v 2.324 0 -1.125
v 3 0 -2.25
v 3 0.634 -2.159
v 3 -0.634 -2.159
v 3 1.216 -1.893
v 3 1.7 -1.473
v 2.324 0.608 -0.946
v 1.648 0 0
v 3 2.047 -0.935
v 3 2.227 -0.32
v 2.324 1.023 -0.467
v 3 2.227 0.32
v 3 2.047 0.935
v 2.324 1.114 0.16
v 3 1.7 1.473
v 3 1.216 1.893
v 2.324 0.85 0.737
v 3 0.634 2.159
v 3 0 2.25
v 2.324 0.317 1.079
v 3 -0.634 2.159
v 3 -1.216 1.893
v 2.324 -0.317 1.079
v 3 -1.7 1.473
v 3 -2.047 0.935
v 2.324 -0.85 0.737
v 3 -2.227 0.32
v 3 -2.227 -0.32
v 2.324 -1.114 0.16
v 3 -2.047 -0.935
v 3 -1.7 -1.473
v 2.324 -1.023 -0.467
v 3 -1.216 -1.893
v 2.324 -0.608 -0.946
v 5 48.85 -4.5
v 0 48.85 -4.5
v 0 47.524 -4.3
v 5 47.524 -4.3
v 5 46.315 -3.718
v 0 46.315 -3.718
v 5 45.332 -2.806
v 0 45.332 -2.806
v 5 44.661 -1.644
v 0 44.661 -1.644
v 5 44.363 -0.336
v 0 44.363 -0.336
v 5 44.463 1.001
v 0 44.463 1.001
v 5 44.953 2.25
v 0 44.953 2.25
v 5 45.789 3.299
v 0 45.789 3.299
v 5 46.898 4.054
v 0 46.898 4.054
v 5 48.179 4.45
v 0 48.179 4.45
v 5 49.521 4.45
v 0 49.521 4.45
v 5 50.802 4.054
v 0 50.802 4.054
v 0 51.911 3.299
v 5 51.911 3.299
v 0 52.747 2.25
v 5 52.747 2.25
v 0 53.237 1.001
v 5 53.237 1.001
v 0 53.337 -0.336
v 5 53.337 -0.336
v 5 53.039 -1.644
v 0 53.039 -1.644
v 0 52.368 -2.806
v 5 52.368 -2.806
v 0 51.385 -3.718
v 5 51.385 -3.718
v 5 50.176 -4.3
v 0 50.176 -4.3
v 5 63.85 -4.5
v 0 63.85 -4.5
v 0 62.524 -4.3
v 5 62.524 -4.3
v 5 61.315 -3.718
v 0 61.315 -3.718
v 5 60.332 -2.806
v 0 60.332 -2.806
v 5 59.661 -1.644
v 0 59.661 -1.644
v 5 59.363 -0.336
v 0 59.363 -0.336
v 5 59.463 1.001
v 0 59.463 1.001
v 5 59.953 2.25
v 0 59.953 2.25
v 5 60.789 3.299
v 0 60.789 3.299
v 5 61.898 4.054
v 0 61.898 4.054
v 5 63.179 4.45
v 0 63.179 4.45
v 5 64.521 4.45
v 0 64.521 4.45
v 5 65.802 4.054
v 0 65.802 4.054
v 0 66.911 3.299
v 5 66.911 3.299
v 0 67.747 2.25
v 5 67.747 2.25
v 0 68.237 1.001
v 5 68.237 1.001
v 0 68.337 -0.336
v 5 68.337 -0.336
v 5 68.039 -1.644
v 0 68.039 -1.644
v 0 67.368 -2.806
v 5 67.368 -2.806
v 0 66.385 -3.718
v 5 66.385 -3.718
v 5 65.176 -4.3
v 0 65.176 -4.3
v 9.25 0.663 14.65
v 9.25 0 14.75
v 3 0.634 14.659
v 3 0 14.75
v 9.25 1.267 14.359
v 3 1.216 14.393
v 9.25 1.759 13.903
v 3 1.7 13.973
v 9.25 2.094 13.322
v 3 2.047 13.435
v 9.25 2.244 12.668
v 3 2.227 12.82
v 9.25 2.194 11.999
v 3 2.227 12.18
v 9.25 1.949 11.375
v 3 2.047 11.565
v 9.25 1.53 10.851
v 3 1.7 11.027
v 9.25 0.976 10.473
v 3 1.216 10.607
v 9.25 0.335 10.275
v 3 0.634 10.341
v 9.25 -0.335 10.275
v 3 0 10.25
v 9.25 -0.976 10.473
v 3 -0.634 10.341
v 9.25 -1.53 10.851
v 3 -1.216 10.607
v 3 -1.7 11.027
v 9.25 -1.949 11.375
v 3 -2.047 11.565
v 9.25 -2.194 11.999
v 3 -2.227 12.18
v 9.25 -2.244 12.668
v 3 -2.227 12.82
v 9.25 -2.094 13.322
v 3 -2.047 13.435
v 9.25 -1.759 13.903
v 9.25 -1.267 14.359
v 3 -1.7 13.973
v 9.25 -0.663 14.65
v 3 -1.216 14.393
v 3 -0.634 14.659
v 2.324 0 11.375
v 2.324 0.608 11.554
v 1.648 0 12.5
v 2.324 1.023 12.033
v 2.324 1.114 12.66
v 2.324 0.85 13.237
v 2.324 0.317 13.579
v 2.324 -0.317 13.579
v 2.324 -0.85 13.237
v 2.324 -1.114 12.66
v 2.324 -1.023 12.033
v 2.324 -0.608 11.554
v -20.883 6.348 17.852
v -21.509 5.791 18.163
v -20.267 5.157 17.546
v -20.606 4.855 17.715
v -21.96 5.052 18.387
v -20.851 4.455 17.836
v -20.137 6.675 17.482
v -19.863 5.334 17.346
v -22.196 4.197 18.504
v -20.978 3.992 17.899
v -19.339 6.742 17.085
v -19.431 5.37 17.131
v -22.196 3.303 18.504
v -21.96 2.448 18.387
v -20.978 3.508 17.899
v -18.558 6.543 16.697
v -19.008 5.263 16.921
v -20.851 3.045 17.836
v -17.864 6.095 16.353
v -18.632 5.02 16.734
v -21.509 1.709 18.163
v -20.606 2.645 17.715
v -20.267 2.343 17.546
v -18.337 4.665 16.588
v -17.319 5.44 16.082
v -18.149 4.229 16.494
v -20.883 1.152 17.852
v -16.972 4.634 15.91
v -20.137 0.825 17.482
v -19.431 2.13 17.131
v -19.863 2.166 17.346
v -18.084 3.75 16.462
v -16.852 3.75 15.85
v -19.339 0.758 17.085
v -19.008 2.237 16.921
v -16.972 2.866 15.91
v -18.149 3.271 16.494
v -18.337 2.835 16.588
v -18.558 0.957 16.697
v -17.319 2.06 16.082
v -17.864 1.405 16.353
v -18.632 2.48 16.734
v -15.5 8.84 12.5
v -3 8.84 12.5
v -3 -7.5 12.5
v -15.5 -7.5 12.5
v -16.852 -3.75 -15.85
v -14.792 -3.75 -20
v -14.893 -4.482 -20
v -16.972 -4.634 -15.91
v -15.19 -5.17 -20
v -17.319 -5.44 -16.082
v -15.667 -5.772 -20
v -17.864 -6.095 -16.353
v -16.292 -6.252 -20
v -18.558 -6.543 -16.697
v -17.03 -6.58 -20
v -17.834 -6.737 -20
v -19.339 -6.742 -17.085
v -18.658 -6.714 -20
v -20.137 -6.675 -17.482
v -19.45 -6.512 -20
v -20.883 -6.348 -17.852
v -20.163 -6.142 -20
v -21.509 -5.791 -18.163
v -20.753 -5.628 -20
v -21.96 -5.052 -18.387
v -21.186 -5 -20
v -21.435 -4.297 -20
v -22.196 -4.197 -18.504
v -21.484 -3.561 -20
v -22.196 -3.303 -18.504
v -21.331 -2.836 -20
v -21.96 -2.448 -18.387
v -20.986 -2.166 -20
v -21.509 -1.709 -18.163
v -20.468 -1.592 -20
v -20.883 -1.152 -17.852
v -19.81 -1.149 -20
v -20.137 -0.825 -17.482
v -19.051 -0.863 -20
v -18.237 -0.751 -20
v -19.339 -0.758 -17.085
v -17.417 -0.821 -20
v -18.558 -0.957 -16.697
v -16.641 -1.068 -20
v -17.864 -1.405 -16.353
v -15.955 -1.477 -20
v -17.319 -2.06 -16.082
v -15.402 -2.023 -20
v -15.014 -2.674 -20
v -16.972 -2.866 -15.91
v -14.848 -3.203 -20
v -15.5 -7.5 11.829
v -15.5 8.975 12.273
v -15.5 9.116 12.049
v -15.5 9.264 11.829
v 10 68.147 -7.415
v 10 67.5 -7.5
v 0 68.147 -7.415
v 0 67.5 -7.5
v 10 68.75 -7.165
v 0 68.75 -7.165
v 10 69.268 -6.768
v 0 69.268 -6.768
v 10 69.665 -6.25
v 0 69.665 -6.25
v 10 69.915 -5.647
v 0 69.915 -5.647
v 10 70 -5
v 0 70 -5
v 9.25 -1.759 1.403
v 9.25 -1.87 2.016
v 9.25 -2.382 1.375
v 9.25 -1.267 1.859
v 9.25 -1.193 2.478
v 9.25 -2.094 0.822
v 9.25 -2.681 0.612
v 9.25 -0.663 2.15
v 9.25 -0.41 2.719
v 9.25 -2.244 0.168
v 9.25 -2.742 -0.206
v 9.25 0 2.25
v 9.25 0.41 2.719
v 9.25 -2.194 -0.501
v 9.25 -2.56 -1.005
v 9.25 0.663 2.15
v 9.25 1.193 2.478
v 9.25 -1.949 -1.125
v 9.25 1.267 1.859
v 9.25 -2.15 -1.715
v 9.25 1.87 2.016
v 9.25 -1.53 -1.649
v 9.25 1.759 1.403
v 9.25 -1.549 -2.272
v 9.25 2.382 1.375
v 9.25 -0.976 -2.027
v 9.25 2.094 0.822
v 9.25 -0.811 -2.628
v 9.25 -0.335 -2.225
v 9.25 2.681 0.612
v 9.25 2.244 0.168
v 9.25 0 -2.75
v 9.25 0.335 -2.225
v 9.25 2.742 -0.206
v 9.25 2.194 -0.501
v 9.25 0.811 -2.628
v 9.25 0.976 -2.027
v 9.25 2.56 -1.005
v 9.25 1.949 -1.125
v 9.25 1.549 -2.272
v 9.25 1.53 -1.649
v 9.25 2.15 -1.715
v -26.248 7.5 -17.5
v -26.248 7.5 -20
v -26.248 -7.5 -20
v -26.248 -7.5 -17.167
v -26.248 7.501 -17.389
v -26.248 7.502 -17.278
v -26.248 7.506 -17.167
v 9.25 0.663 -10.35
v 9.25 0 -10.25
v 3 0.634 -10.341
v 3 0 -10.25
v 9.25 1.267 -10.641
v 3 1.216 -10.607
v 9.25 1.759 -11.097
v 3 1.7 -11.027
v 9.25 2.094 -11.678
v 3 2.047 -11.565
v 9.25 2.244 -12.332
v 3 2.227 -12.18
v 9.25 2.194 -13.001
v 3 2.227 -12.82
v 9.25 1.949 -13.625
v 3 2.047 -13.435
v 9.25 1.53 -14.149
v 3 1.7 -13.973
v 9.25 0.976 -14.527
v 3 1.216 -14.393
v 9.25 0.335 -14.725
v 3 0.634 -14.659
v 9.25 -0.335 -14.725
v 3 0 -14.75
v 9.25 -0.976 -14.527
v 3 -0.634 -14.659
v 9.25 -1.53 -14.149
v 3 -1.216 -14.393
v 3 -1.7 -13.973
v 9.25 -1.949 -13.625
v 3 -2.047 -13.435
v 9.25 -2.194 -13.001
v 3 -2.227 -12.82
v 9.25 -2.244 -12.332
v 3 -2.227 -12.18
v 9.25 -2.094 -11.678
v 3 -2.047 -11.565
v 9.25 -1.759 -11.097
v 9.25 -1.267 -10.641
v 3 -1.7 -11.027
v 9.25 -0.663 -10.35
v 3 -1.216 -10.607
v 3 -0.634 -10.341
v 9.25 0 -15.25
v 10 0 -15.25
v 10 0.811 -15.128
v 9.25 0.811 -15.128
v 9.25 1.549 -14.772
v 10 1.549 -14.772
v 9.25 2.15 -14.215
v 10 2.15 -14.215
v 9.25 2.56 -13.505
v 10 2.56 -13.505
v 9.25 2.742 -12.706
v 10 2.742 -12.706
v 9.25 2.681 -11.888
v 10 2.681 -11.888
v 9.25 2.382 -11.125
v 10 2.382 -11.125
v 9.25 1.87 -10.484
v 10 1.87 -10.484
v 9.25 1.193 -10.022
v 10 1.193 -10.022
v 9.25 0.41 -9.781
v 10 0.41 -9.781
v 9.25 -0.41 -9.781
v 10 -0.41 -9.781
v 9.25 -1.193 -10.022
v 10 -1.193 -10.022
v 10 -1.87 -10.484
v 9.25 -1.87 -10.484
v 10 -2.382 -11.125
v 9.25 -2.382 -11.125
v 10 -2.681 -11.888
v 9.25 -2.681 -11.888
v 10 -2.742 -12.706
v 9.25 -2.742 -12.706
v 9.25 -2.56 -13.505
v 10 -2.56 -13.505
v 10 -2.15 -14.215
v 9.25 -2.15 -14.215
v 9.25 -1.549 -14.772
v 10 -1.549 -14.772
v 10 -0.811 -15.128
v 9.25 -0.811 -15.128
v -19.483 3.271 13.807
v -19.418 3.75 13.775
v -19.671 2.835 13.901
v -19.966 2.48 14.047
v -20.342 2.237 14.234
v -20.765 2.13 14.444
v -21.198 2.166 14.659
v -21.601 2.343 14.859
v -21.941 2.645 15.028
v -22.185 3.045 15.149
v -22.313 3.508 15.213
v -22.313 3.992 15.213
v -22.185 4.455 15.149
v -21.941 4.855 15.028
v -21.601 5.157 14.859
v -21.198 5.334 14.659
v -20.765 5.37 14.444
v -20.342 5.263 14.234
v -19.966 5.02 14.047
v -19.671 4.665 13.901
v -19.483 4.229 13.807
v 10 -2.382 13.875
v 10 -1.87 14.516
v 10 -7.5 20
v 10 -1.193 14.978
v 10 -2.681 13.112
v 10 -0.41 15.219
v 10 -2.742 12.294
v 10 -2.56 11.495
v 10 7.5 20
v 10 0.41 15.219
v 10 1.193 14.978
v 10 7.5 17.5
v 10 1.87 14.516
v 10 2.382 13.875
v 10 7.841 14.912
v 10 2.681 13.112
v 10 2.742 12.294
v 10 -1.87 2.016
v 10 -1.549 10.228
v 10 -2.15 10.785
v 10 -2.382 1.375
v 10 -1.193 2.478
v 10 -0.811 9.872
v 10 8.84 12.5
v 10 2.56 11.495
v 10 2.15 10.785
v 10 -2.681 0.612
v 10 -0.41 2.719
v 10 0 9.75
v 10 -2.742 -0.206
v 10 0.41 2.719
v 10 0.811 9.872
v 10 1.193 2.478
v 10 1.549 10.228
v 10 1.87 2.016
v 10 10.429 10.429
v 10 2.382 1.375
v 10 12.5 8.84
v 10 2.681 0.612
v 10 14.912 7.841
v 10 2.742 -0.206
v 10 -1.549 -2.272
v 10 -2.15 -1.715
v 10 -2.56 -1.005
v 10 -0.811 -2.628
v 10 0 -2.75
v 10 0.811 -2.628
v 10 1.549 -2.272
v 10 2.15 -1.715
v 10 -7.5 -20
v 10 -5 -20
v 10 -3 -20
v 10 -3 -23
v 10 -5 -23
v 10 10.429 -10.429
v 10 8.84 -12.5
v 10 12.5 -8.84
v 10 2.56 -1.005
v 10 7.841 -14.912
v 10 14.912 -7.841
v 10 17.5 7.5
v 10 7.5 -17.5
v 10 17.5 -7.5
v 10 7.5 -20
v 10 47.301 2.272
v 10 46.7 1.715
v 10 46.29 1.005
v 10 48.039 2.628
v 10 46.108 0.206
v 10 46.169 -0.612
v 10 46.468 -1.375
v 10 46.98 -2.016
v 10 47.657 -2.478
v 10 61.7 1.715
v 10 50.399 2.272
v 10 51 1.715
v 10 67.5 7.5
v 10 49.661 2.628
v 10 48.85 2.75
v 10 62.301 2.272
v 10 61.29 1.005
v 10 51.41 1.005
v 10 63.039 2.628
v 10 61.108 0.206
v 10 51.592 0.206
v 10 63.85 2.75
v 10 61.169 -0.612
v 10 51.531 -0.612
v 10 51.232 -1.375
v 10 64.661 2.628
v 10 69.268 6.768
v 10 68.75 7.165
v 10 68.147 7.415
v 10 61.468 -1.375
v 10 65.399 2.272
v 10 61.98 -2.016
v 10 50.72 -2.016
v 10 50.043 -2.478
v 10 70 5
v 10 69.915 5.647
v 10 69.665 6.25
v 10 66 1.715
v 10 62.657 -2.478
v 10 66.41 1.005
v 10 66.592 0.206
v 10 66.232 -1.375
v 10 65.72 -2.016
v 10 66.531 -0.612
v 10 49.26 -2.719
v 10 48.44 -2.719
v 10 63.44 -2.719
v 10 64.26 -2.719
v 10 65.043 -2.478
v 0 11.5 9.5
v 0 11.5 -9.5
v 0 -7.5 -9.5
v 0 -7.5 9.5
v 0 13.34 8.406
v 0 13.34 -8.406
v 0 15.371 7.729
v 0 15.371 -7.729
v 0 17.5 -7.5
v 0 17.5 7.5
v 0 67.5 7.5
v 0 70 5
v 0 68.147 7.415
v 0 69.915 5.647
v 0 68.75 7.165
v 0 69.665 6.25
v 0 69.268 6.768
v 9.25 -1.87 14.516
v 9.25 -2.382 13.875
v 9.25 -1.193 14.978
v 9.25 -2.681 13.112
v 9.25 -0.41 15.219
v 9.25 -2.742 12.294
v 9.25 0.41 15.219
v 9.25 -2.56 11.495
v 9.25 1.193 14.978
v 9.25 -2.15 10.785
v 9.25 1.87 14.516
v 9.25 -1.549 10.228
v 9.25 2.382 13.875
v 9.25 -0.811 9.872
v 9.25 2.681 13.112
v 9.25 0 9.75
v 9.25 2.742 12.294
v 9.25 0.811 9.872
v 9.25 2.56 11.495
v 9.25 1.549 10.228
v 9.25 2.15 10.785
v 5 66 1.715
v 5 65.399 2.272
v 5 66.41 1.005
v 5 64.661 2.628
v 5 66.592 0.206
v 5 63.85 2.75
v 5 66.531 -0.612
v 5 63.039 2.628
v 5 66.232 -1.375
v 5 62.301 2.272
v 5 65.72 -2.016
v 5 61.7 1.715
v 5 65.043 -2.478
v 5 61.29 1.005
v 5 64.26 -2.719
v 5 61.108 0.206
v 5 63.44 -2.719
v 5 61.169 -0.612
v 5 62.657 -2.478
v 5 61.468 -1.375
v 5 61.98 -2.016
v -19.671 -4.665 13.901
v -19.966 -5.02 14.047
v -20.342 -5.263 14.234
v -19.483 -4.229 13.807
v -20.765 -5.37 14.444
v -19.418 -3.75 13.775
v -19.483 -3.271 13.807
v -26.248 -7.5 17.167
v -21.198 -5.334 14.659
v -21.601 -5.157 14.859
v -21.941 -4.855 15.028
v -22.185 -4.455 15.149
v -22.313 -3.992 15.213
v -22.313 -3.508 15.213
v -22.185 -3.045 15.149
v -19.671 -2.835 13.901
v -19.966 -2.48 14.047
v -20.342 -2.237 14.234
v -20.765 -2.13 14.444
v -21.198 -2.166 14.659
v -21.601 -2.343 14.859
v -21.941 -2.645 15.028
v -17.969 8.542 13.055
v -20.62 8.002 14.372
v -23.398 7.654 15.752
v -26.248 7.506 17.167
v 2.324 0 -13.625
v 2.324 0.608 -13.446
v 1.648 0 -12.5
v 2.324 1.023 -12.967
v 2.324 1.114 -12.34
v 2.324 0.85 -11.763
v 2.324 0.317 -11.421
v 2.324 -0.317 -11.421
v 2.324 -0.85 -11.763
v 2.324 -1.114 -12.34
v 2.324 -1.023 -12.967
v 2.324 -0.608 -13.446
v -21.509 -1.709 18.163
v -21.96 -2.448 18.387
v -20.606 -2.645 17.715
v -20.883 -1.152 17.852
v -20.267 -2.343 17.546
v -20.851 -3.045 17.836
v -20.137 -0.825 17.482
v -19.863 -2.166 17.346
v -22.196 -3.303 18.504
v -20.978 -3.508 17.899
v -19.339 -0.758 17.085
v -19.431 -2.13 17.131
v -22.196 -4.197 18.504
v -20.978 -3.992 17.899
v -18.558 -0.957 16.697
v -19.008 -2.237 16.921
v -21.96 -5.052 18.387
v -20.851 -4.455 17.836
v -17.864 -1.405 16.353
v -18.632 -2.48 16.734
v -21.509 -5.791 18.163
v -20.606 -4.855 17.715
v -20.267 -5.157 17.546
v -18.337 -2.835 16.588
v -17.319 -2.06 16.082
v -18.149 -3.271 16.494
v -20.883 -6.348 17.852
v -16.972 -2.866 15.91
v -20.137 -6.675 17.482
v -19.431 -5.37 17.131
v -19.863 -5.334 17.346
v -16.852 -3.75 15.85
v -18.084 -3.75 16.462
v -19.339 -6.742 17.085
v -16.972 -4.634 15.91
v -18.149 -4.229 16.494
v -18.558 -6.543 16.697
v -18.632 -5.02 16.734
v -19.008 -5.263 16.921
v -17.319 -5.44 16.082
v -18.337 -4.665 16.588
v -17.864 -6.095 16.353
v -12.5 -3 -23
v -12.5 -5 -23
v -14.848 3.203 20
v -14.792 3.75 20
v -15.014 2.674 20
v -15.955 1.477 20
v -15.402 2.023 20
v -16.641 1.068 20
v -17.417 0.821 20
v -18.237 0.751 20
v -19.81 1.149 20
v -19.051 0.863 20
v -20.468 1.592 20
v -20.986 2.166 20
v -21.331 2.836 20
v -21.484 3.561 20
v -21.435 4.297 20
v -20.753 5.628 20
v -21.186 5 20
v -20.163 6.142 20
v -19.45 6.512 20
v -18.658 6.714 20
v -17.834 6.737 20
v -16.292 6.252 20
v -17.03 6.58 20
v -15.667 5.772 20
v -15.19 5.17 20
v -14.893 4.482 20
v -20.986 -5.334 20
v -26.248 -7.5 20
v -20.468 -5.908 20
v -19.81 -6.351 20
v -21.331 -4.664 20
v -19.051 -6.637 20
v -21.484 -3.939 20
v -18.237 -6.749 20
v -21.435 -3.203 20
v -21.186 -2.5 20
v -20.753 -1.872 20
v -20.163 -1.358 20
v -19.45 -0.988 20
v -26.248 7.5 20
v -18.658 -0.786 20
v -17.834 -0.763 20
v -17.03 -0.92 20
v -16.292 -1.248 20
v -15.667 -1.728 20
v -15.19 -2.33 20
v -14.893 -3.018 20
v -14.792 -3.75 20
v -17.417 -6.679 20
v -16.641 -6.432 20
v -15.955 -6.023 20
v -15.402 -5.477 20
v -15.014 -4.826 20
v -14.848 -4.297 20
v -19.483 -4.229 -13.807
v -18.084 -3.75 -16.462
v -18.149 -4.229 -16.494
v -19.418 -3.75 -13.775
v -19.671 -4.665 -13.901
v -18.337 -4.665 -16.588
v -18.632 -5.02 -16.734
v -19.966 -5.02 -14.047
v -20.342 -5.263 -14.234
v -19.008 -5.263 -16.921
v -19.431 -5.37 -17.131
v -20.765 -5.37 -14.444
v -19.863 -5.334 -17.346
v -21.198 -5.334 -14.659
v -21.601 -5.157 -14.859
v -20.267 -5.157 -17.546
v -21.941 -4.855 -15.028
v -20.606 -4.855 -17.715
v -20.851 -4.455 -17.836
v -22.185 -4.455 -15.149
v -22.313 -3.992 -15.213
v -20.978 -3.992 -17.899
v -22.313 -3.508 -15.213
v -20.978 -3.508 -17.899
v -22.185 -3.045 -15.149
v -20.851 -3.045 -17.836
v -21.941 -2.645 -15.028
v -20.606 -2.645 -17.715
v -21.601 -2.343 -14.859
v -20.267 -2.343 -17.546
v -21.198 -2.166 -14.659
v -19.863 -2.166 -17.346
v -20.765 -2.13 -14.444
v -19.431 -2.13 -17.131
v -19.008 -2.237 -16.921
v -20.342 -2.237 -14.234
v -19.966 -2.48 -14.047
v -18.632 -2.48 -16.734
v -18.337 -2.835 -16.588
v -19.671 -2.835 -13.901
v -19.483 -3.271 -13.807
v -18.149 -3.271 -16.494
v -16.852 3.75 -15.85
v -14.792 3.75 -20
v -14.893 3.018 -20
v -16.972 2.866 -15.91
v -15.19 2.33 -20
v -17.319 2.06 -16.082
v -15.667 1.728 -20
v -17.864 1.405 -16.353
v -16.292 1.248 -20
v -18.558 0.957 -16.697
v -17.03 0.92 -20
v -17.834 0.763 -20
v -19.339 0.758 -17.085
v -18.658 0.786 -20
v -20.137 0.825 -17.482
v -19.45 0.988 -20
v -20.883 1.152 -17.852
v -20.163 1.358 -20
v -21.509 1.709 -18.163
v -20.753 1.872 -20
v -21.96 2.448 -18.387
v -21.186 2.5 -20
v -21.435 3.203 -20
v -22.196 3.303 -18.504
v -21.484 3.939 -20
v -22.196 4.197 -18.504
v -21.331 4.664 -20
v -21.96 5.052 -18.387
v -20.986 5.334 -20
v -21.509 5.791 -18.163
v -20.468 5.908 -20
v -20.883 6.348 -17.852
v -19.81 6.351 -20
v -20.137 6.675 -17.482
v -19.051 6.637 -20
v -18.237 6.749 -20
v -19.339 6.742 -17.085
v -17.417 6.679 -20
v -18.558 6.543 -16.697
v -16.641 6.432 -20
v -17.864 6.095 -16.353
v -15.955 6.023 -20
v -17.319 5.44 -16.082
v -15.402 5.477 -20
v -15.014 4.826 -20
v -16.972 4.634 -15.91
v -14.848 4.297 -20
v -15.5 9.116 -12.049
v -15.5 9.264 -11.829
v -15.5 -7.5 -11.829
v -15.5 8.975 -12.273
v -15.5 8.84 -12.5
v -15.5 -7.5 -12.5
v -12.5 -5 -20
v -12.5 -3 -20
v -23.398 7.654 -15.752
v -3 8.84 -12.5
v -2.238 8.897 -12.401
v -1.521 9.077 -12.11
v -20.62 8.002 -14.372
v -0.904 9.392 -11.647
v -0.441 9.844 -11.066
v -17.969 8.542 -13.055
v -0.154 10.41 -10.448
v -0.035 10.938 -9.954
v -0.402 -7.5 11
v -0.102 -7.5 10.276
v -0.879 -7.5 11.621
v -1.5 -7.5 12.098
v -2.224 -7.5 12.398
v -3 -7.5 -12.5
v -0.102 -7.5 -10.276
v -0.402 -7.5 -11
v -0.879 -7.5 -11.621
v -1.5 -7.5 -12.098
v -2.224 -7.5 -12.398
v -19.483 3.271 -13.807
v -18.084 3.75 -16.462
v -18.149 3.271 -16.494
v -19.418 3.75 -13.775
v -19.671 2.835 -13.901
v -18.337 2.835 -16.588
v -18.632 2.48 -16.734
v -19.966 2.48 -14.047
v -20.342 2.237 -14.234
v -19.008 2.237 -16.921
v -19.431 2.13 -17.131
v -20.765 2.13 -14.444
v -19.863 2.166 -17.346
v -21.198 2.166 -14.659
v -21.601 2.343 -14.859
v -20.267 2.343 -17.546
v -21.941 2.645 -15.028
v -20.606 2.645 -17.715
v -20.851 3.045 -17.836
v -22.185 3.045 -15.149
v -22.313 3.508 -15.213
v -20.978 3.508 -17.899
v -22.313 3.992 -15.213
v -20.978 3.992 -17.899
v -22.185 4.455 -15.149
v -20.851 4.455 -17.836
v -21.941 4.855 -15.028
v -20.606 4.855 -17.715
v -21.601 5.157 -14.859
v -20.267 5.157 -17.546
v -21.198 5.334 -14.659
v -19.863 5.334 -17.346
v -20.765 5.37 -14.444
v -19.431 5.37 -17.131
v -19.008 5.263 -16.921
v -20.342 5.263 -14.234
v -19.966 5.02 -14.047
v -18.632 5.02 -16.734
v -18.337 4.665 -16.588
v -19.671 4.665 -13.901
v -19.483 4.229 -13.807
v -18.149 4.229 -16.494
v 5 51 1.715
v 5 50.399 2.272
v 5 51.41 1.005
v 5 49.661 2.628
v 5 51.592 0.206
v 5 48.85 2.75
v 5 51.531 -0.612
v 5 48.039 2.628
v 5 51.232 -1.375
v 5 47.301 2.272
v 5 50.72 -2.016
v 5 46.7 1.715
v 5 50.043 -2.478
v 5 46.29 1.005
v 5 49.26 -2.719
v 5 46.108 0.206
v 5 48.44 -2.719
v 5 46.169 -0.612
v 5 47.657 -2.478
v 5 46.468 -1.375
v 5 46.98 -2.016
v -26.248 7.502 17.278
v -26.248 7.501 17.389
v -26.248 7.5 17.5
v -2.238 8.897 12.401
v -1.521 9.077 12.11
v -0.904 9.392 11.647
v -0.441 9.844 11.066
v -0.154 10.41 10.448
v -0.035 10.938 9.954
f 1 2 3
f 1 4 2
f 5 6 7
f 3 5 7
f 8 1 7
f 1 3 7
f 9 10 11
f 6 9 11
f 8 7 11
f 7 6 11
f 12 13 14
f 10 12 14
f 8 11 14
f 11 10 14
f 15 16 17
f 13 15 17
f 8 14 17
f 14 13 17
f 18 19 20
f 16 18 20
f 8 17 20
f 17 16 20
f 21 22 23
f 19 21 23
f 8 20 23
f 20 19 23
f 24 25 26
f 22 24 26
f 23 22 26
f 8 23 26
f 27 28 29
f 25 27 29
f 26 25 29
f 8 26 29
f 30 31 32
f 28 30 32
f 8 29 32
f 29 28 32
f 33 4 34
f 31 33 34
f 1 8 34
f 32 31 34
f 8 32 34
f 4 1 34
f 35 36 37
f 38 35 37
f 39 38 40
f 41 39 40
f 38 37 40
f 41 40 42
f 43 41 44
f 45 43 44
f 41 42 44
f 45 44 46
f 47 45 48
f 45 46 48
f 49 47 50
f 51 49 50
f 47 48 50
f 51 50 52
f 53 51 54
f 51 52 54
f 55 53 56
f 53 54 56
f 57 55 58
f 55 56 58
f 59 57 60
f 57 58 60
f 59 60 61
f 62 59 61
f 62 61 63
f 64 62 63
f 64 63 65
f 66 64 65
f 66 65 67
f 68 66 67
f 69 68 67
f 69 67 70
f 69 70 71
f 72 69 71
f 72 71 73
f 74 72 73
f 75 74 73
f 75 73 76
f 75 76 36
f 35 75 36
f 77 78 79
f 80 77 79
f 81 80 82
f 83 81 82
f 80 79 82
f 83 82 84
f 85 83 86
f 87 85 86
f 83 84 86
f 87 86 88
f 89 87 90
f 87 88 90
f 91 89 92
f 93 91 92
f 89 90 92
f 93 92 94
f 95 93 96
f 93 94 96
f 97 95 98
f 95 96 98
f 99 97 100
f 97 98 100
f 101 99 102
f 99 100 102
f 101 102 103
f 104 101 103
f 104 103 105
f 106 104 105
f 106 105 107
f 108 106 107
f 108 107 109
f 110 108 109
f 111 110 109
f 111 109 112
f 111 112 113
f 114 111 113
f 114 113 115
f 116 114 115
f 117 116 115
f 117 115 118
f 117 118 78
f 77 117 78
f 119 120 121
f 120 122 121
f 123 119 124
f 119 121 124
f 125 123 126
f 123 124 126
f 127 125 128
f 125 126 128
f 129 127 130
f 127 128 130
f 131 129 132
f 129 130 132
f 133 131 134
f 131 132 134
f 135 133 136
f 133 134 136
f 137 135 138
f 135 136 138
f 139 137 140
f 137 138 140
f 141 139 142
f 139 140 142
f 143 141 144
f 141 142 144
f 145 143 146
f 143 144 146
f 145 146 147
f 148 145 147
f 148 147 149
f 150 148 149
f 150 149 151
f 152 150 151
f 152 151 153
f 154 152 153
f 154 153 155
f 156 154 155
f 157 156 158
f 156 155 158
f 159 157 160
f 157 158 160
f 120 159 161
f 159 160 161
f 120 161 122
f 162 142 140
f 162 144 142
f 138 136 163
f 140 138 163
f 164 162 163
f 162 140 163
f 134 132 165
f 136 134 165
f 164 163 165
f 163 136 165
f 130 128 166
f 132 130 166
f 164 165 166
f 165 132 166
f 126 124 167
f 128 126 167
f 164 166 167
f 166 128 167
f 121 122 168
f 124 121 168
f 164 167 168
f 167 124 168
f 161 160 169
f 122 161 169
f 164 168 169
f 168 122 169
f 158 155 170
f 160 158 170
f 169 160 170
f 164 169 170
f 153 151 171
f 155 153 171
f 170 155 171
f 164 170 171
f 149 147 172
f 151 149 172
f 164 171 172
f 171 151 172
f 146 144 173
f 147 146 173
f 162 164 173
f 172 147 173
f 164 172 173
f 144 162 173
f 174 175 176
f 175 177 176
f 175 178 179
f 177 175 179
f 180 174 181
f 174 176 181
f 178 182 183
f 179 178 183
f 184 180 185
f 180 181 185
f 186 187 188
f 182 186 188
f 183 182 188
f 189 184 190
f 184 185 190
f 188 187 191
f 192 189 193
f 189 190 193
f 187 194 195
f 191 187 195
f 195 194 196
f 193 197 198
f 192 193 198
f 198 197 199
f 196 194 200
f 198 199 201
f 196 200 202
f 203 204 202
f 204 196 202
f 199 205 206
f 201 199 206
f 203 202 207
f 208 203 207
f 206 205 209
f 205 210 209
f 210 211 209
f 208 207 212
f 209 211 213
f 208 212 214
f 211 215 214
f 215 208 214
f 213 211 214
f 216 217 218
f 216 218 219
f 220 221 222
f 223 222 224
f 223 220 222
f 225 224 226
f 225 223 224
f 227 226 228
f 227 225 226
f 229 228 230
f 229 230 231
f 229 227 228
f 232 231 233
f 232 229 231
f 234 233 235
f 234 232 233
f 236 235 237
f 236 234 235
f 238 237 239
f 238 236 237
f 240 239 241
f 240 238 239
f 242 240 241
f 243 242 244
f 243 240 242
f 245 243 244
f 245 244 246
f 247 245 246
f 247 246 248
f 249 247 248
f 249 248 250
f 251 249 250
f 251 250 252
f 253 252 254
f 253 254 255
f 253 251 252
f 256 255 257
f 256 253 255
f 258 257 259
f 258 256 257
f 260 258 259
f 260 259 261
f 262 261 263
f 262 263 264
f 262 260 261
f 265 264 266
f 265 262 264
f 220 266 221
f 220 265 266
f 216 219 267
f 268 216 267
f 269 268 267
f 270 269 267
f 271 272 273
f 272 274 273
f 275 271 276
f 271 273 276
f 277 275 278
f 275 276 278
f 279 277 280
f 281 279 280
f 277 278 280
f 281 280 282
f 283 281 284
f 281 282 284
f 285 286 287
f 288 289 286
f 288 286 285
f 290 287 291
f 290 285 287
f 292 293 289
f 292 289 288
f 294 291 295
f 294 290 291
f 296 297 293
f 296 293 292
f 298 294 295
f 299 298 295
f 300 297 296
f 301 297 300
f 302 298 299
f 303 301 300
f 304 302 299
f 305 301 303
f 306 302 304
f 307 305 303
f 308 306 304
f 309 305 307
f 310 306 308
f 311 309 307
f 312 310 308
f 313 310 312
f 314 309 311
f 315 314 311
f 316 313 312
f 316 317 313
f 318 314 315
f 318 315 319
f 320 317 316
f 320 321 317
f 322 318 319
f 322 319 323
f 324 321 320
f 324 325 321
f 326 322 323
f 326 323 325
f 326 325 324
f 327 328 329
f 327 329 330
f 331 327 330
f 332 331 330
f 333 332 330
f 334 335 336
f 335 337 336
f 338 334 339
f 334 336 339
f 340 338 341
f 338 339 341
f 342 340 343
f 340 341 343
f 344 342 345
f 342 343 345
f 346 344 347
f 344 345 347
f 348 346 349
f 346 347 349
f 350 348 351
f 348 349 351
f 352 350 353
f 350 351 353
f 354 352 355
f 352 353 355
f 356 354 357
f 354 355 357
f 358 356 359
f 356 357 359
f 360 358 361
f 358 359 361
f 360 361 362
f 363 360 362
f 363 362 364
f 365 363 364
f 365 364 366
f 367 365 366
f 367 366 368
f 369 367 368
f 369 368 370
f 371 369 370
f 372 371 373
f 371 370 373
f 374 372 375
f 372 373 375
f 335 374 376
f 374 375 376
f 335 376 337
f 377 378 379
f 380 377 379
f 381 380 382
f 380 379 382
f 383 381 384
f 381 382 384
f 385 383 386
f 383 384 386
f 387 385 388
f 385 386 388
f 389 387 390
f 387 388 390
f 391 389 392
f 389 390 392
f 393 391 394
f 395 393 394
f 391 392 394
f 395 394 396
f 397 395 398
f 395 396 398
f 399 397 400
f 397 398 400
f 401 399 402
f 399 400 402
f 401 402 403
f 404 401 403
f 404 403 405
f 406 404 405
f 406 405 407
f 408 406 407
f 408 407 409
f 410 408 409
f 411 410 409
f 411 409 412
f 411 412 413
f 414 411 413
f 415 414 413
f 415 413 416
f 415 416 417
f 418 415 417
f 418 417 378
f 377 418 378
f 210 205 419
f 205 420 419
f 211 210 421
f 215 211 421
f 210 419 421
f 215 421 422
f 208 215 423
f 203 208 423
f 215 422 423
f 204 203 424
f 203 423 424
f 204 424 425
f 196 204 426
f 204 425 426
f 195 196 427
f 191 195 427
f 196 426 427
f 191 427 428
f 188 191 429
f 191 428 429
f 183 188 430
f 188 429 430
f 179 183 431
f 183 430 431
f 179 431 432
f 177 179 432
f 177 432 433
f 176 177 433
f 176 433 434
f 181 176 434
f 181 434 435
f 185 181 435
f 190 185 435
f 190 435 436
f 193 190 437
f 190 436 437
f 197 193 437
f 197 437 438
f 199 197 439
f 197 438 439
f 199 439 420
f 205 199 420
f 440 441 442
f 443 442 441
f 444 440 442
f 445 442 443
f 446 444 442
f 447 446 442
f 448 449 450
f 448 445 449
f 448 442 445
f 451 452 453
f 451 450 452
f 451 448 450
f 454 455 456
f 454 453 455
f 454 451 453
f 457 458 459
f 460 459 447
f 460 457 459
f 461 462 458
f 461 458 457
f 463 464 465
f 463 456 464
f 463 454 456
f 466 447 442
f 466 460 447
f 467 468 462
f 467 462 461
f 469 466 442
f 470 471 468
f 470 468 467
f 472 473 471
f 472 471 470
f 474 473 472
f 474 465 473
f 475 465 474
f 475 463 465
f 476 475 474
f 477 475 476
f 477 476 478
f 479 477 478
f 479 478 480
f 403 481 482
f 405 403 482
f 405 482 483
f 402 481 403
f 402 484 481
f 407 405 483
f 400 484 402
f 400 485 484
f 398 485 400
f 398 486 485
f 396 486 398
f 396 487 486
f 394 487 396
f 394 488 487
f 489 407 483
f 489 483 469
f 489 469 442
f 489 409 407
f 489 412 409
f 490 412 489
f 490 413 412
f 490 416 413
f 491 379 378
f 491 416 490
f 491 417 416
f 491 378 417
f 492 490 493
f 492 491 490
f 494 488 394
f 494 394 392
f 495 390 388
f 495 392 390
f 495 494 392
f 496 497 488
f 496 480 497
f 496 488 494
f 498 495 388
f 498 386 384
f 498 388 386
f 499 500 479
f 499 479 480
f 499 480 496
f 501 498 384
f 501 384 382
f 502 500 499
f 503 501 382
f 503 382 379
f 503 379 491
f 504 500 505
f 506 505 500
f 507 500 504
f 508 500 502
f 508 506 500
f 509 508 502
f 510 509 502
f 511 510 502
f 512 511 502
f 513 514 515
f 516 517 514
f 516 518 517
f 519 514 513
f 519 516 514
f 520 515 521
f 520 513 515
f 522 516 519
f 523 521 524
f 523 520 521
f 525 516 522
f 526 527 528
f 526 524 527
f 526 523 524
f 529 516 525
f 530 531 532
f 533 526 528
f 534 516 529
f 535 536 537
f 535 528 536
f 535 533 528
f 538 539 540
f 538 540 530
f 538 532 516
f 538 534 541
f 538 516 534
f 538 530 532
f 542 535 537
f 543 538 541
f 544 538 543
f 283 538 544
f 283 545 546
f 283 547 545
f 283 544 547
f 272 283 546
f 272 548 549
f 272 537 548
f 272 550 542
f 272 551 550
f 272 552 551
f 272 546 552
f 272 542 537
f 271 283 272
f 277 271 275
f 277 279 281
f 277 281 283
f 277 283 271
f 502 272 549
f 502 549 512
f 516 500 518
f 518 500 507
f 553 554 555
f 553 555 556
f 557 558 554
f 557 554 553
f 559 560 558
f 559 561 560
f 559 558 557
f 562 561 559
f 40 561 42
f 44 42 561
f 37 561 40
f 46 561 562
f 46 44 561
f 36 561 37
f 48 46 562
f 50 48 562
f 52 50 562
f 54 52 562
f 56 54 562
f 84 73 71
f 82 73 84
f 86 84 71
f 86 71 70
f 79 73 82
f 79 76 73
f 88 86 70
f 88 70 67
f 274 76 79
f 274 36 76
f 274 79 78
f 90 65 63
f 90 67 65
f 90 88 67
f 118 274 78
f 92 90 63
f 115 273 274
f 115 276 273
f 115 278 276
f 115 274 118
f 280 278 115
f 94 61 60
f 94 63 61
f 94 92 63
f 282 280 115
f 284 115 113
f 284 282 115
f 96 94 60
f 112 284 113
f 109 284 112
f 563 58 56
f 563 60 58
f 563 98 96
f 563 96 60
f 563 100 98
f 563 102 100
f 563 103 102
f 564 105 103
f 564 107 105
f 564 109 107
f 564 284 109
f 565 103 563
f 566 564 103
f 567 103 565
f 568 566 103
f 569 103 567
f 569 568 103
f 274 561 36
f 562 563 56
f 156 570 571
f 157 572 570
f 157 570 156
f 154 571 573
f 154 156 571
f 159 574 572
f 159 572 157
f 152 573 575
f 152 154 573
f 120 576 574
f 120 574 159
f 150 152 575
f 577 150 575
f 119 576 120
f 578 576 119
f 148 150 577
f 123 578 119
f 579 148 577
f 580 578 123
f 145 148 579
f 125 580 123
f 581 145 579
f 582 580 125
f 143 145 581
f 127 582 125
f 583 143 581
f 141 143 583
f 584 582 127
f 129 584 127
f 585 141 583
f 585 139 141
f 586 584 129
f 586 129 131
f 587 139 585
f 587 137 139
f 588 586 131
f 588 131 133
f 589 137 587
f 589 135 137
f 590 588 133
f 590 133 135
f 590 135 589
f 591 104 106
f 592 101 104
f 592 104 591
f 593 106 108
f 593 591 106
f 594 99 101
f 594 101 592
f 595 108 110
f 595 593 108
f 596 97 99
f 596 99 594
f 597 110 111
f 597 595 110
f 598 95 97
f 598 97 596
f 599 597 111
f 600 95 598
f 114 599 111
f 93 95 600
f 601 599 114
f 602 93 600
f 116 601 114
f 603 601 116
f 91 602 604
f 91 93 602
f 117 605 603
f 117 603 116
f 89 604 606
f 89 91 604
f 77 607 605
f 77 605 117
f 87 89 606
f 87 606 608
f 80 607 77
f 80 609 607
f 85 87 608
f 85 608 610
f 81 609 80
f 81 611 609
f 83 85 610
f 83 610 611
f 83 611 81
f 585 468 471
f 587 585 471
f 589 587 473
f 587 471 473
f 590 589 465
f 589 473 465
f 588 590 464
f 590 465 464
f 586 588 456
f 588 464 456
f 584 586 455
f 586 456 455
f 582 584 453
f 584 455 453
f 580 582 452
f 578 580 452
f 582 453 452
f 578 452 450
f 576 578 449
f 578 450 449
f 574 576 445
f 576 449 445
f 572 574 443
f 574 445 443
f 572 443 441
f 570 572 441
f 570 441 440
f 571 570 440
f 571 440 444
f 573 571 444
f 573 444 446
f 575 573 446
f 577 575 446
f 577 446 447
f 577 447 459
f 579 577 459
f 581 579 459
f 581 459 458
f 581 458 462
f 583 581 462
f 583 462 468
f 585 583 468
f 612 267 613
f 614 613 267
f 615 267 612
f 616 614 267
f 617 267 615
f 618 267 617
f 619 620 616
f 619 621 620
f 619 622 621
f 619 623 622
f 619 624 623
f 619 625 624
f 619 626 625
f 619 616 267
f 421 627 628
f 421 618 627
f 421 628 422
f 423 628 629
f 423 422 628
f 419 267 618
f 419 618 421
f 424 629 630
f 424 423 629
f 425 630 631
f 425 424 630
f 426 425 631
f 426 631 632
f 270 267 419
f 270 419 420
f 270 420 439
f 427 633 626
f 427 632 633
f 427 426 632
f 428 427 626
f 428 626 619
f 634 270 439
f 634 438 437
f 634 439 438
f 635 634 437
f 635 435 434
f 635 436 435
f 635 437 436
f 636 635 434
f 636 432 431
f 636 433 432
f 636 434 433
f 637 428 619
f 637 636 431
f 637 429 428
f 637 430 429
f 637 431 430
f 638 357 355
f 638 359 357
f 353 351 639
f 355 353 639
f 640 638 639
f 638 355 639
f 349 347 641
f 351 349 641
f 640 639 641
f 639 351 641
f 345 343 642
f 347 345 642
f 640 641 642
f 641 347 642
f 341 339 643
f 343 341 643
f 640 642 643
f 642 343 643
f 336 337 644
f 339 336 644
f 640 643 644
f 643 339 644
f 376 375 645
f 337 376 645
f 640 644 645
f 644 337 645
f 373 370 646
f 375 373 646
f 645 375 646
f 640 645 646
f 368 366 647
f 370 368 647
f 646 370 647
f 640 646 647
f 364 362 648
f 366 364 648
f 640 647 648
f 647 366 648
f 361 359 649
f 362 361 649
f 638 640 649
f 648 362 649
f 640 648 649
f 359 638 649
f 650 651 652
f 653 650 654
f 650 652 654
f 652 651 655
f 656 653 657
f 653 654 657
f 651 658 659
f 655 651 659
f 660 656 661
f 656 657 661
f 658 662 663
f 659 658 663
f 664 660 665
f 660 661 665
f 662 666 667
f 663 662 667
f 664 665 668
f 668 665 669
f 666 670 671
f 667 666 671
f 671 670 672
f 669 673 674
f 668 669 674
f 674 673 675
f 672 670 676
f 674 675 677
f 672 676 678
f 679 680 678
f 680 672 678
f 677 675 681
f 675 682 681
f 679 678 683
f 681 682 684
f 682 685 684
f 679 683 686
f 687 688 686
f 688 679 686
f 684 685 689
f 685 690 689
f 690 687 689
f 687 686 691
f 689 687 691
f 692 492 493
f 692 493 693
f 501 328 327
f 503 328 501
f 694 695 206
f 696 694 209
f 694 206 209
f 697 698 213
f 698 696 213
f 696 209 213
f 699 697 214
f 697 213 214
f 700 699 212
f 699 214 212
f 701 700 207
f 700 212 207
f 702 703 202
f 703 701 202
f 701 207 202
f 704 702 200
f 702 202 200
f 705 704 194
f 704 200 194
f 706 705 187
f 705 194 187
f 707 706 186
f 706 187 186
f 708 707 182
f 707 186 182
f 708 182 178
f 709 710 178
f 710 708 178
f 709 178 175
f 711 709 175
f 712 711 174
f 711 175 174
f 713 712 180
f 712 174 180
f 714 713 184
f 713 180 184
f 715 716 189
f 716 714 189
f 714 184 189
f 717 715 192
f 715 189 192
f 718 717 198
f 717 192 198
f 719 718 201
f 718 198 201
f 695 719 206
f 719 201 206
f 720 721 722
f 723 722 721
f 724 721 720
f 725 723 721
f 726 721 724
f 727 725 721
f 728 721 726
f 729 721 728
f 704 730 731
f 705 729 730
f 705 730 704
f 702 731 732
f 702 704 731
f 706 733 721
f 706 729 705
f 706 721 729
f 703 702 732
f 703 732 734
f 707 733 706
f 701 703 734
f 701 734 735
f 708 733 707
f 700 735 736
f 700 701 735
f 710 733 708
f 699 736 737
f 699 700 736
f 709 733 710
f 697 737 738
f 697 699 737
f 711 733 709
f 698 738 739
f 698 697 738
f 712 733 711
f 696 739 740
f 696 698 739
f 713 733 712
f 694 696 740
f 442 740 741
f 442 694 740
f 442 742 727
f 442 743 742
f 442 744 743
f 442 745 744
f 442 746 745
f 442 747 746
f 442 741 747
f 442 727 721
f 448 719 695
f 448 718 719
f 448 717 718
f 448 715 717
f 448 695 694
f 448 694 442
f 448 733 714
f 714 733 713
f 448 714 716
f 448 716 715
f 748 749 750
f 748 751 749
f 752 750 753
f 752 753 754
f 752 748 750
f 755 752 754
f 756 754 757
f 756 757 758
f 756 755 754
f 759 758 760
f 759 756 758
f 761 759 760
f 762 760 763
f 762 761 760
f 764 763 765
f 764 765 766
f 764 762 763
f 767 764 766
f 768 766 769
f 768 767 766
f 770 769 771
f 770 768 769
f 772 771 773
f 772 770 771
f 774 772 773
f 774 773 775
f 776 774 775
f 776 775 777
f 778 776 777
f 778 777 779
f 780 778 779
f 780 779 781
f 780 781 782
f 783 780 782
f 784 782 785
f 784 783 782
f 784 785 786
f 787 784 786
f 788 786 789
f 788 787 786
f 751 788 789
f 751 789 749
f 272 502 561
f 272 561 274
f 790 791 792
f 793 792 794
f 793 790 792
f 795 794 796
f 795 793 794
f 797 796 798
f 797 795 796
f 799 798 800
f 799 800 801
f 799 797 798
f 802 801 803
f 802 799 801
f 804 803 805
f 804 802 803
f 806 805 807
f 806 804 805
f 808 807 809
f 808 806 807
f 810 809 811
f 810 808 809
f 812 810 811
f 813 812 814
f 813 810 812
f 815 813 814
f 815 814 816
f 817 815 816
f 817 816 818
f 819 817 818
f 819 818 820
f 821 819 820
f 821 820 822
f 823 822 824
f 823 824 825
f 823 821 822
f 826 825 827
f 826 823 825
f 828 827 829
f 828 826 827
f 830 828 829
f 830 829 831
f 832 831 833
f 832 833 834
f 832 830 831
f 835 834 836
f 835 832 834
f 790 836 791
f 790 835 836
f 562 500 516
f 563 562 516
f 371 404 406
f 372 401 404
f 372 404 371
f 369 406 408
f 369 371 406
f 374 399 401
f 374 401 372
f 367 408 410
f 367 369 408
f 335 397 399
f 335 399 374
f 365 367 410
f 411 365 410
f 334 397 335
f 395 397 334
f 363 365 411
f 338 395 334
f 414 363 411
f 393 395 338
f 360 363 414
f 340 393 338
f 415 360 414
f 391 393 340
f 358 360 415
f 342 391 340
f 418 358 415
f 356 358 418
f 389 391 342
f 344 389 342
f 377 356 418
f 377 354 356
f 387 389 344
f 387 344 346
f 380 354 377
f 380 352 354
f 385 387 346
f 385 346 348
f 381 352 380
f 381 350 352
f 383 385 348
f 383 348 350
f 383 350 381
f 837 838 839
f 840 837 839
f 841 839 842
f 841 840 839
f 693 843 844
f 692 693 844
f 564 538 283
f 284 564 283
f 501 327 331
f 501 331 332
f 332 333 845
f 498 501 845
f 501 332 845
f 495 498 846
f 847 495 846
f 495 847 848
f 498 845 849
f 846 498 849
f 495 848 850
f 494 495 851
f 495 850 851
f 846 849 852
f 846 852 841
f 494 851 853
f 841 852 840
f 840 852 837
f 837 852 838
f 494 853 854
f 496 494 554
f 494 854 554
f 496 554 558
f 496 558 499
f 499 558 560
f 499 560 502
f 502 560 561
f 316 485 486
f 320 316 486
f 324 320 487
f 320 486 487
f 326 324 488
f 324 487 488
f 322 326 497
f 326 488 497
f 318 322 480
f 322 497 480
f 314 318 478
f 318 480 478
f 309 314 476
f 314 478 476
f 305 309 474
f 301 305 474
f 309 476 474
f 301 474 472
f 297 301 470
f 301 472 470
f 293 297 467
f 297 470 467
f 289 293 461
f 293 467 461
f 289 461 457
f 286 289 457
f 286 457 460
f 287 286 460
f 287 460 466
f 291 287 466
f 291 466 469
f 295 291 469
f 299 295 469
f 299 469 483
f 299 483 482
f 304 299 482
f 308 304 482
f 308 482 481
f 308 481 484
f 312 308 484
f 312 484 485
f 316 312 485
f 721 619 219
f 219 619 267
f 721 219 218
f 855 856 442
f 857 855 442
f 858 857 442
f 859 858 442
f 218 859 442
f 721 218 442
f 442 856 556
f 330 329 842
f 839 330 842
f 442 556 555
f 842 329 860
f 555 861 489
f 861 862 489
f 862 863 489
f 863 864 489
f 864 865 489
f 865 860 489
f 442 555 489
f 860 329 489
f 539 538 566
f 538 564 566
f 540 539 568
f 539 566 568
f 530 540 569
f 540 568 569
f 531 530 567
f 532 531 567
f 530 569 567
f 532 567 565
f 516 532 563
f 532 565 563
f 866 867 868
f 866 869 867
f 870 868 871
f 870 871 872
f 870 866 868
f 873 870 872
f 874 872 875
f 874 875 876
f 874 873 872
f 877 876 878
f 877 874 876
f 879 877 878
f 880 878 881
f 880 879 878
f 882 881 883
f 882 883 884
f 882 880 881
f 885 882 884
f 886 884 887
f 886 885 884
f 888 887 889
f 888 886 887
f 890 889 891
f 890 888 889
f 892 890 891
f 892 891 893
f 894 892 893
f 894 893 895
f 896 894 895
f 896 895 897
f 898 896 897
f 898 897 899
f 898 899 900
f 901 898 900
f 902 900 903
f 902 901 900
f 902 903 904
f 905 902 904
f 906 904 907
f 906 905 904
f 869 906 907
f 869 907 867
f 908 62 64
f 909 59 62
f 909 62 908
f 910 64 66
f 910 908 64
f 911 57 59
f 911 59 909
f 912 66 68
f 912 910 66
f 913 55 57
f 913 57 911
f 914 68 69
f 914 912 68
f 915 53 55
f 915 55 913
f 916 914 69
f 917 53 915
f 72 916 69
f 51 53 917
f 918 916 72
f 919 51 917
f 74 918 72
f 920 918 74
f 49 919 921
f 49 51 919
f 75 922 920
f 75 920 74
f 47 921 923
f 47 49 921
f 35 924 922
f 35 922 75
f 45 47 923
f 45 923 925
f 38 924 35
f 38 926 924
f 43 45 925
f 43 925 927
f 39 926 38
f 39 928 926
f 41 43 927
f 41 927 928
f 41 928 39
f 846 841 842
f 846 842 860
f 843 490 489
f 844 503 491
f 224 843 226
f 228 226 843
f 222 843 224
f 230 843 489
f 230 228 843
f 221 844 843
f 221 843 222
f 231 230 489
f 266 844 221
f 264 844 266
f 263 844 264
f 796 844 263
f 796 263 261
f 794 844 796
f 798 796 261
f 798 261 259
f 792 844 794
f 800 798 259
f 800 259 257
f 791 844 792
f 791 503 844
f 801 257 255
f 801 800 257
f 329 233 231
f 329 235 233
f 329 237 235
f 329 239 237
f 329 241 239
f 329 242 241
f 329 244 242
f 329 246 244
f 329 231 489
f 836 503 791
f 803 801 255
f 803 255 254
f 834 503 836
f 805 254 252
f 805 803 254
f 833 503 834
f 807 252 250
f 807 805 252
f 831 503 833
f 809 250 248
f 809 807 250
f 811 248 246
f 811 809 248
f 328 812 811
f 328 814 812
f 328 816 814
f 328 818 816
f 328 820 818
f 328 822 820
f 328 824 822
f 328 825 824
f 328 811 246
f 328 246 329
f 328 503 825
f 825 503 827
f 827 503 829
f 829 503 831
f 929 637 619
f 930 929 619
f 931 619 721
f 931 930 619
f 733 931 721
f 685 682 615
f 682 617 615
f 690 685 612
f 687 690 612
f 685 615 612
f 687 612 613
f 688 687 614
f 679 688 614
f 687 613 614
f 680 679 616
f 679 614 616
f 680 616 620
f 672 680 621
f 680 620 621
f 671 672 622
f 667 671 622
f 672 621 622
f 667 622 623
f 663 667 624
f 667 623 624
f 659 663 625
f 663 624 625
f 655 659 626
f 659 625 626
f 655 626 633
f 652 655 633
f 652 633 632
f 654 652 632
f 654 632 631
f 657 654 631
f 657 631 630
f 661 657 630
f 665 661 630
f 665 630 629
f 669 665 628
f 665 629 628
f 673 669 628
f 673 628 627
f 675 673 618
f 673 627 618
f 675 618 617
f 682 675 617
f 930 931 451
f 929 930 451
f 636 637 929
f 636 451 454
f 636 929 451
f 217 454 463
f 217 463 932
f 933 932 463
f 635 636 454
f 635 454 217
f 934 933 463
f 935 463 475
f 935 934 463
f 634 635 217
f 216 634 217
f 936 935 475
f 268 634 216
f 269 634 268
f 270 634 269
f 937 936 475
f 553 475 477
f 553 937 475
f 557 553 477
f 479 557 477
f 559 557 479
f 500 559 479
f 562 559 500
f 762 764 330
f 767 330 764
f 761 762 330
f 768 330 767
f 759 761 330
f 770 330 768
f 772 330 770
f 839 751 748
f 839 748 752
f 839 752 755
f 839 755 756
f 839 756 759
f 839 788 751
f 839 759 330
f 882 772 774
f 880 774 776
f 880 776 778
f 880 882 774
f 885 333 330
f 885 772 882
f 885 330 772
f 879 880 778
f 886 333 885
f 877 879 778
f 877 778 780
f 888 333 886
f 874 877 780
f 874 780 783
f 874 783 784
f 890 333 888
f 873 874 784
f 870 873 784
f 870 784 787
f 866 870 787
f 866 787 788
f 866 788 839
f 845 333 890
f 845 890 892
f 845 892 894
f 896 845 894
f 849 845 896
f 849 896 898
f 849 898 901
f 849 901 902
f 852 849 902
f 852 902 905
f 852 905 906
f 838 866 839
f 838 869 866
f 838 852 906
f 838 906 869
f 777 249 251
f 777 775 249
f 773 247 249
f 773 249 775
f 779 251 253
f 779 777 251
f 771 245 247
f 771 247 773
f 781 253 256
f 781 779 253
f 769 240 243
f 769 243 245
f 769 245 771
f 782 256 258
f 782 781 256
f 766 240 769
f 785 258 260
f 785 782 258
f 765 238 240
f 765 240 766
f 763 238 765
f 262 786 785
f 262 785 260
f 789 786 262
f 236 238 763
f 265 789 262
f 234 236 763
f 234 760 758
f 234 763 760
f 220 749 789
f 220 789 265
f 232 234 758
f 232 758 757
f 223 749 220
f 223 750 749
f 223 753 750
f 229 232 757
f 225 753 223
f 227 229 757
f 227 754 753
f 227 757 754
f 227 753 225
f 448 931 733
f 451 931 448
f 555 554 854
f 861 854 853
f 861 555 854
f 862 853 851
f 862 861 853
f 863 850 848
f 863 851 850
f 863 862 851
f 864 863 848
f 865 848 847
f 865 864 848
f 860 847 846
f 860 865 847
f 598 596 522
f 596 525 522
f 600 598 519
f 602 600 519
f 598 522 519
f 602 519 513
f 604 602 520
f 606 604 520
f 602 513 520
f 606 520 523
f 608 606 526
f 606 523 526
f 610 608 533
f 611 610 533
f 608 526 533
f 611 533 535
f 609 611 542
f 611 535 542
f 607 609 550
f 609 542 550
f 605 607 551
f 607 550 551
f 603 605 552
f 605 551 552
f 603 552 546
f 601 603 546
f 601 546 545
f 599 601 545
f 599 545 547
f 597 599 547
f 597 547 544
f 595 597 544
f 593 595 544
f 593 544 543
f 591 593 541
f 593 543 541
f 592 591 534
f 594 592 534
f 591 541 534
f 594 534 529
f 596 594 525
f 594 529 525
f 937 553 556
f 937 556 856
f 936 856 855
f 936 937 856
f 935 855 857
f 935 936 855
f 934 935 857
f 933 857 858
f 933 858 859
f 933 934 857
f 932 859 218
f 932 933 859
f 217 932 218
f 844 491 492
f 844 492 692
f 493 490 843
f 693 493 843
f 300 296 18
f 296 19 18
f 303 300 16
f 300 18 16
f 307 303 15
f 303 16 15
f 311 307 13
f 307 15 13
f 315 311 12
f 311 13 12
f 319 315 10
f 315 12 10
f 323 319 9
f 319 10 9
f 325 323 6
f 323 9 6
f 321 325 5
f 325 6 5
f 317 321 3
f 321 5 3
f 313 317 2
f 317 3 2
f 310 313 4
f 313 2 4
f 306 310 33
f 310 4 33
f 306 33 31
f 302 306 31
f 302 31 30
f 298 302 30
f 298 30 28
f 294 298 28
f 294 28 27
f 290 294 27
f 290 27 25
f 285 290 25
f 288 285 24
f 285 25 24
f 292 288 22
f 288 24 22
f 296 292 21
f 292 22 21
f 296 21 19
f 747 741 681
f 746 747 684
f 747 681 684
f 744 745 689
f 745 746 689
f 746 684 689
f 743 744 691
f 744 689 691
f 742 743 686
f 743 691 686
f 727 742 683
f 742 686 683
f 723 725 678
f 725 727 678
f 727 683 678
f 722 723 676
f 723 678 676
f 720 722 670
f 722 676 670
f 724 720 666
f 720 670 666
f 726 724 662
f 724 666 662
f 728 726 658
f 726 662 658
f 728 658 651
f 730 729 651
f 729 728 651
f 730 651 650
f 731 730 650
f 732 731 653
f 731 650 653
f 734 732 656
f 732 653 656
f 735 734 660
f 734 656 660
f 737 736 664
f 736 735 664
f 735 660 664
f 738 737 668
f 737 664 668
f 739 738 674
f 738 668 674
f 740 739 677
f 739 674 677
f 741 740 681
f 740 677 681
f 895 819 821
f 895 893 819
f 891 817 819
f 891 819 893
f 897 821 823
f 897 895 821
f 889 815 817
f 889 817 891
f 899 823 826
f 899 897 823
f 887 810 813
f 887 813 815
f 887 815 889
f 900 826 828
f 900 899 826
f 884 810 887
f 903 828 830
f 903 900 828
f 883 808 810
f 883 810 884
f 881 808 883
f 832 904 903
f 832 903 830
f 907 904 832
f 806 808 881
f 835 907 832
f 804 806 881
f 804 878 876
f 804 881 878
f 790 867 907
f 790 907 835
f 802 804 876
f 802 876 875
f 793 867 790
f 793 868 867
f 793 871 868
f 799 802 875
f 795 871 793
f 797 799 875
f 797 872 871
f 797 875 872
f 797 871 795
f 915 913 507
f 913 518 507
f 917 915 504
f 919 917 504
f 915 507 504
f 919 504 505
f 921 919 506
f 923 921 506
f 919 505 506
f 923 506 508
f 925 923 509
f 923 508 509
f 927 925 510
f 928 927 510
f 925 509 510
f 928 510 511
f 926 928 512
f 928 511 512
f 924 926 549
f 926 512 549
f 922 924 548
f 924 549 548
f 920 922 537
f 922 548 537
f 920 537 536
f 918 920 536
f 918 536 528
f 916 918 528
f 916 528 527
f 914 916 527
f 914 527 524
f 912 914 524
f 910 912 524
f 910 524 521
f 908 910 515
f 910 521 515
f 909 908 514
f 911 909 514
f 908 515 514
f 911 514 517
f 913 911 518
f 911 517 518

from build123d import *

# Parameters (mm, degrees)
BOSS_EXTRUDE1_DEPTH            = 7.5
CBORE_FOR_M3_SHCS1_AT_2_COUNT  = 2
CBORE_FOR_M3_SHCS1_AT_2_PITCH  = 7.5
FILLET1_R                      = 3
CBORE_FOR_M3_SHCS2_D           = 4.5
CBORE_FOR_M3_SHCS2_DEPTH       = 7
CBORE_FOR_M3_SHCS2_CBORE_D     = 5.5
CBORE_FOR_M3_SHCS2_CBORE_DEPTH = 0.75
CBORE_FOR_M3_SHCS2_TIP         = 1.351936393
SKETCH9_W                      = 15
SKETCH9_H                      = 62.5
BOSS_EXTRUDE2_DEPTH            = 10
CBORE_FOR_M5_SHCS1_D           = 5.5
CBORE_FOR_M5_SHCS1_DEPTH       = 15
CBORE_FOR_M5_SHCS1_CBORE_D     = 9
CBORE_FOR_M5_SHCS1_CBORE_DEPTH = 5
CBORE_FOR_M5_SHCS1_TIP         = 1.652366702
SKETCH12_W                     = 22.5
SKETCH12_H                     = 2
BOSS_EXTRUDE3_DEPTH            = 3
FILLET2_R                      = 10
FILLET3_R                      = 2.5


with BuildPart() as part:
    # Sketch1 → Boss-Extrude1 (new, symmetric)
    with BuildSketch(Plane(origin=(0, 0, 0), x_dir=(1, 0, 0), z_dir=(0, 1, 0))):
        Polygon((0, 12.5), (0, -12.5), (-15.5, -12.5), (-15.5, -11.829), (-26.247516559, -17.166685624), (-26.247516559, -20), (10, -20), (10, 20), (-26.247516559, 20), (-26.247516559, 17.166685624), (-15.5, 11.829), (-15.5, 12.5), align=None)
    extrude(amount=BOSS_EXTRUDE1_DEPTH, both=True)

    # Sketch4 → CBORE for M3 SHCS1 (revolve, cut)
    with BuildSketch(Plane(origin=(-20.873758279, 3.75, -14.497842812), x_dir=(0.8956263799062305, 0, 0.4448071353025496), z_dir=(0, 1, 0))):
        Polygon((0, 0), (0, 18.6607451), (3, 18.6607451), (3, 3), (1.625, 3), (1.625, 0), align=None)
    cbore_for_m3_shcs1 = revolve(axis=Axis((-23.698283589, 3.75, -8.810615299), (0.44480713530254956, 0, -0.8956263799062304)), mode=Mode.SUBTRACT)

    # CBORE for M3 SHCS1 at 2: CBORE for M3 SHCS1 ×2
    with Locations(*[(0, -i * CBORE_FOR_M3_SHCS1_AT_2_PITCH, 0) for i in range(1, CBORE_FOR_M3_SHCS1_AT_2_COUNT)]):
        add(cbore_for_m3_shcs1, mode=Mode.SUBTRACT)

    # Mirror1: CBORE for M3 SHCS1 across plane
    add(cbore_for_m3_shcs1.mirror(Plane.XY), mode=Mode.SUBTRACT)

    # Mirror1 copy 1 sketch → Mirror1 copy 1 (revolve, cut)
    with BuildSketch(Plane(origin=(-20.873758279, -3.75, 14.497842812), x_dir=(0.8956263799062305, 0, -0.4448071353025496), z_dir=(0, 1, 0))):
        Polygon((0, 0), (0, -18.6607451), (3, -18.6607451), (3, -3), (1.625, -3), (1.625, 0), align=None)
    revolve(axis=Axis((-23.698283589, -3.75, 8.810615299), (-0.44480713530254956, 0, -0.8956263799062304)), mode=Mode.SUBTRACT)

    # Fillet1
    fillet1_edges = [part.edges().sort_by_distance(p)[0] for p in [
        (0, 0, 12.5),
        (0, 0, -12.5),
    ]]
    fillet(fillet1_edges, radius=FILLET1_R)

    # CBORE for M3 SHCS2
    with Locations(Plane(origin=(10, 0, 0), x_dir=(0, 0, -1), z_dir=(1, 0, 0))):
        with Locations((-12.5, 0), (0, 0), (12.5, 0)):
            CounterBoreHole(CBORE_FOR_M3_SHCS2_D / 2, CBORE_FOR_M3_SHCS2_CBORE_D / 2, CBORE_FOR_M3_SHCS2_CBORE_DEPTH, depth=CBORE_FOR_M3_SHCS2_DEPTH)
            with Locations((0, 0, -(CBORE_FOR_M3_SHCS2_DEPTH + CBORE_FOR_M3_SHCS2_TIP / 2))):  # 118° drill point
                Cone(0, CBORE_FOR_M3_SHCS2_D / 2, CBORE_FOR_M3_SHCS2_TIP, mode=Mode.SUBTRACT)

    # Sketch9 → Boss-Extrude2 (add)
    with BuildSketch(Plane(origin=(10, 0, 0), x_dir=(0, 0, -1), z_dir=(1, 0, 0))):
        with Locations((0, 38.75)):
            Rectangle(SKETCH9_W, SKETCH9_H)
    extrude(amount=-BOSS_EXTRUDE2_DEPTH)

    # CBORE for M5 SHCS1
    with Locations(Plane(origin=(0, 0, 0), x_dir=(0, 0, -1), z_dir=(-1, 0, 0))):
        with Locations((0, -63.85), (0, -48.85)):
            CounterBoreHole(CBORE_FOR_M5_SHCS1_D / 2, CBORE_FOR_M5_SHCS1_CBORE_D / 2, CBORE_FOR_M5_SHCS1_CBORE_DEPTH, depth=CBORE_FOR_M5_SHCS1_DEPTH)
            with Locations((0, 0, -(CBORE_FOR_M5_SHCS1_DEPTH + CBORE_FOR_M5_SHCS1_TIP / 2))):  # 118° drill point
                Cone(0, CBORE_FOR_M5_SHCS1_D / 2, CBORE_FOR_M5_SHCS1_TIP, mode=Mode.SUBTRACT)

    # Sketch12 → Boss-Extrude3 (add)
    with BuildSketch(Plane(origin=(0, 0, -20), x_dir=(-1, 0, 0), z_dir=(0, 0, -1))):
        with Locations((1.25, -4)):
            Rectangle(SKETCH12_W, SKETCH12_H)
    extrude(amount=BOSS_EXTRUDE3_DEPTH)

    # Fillet2
    fillet2_edges = [part.edges().sort_by_distance(p)[0] for p in [
        (5, 7.5, -7.5),
        (5, 7.5, 7.5),
    ]]
    fillet(fillet2_edges, radius=FILLET2_R)

    # Fillet3
    fillet3_edges = [part.edges().sort_by_distance(p)[0] for p in [
        (5, 70, -7.5),
        (5, 70, 7.5),
    ]]
    fillet(fillet3_edges, radius=FILLET3_R)


solid = part.part
